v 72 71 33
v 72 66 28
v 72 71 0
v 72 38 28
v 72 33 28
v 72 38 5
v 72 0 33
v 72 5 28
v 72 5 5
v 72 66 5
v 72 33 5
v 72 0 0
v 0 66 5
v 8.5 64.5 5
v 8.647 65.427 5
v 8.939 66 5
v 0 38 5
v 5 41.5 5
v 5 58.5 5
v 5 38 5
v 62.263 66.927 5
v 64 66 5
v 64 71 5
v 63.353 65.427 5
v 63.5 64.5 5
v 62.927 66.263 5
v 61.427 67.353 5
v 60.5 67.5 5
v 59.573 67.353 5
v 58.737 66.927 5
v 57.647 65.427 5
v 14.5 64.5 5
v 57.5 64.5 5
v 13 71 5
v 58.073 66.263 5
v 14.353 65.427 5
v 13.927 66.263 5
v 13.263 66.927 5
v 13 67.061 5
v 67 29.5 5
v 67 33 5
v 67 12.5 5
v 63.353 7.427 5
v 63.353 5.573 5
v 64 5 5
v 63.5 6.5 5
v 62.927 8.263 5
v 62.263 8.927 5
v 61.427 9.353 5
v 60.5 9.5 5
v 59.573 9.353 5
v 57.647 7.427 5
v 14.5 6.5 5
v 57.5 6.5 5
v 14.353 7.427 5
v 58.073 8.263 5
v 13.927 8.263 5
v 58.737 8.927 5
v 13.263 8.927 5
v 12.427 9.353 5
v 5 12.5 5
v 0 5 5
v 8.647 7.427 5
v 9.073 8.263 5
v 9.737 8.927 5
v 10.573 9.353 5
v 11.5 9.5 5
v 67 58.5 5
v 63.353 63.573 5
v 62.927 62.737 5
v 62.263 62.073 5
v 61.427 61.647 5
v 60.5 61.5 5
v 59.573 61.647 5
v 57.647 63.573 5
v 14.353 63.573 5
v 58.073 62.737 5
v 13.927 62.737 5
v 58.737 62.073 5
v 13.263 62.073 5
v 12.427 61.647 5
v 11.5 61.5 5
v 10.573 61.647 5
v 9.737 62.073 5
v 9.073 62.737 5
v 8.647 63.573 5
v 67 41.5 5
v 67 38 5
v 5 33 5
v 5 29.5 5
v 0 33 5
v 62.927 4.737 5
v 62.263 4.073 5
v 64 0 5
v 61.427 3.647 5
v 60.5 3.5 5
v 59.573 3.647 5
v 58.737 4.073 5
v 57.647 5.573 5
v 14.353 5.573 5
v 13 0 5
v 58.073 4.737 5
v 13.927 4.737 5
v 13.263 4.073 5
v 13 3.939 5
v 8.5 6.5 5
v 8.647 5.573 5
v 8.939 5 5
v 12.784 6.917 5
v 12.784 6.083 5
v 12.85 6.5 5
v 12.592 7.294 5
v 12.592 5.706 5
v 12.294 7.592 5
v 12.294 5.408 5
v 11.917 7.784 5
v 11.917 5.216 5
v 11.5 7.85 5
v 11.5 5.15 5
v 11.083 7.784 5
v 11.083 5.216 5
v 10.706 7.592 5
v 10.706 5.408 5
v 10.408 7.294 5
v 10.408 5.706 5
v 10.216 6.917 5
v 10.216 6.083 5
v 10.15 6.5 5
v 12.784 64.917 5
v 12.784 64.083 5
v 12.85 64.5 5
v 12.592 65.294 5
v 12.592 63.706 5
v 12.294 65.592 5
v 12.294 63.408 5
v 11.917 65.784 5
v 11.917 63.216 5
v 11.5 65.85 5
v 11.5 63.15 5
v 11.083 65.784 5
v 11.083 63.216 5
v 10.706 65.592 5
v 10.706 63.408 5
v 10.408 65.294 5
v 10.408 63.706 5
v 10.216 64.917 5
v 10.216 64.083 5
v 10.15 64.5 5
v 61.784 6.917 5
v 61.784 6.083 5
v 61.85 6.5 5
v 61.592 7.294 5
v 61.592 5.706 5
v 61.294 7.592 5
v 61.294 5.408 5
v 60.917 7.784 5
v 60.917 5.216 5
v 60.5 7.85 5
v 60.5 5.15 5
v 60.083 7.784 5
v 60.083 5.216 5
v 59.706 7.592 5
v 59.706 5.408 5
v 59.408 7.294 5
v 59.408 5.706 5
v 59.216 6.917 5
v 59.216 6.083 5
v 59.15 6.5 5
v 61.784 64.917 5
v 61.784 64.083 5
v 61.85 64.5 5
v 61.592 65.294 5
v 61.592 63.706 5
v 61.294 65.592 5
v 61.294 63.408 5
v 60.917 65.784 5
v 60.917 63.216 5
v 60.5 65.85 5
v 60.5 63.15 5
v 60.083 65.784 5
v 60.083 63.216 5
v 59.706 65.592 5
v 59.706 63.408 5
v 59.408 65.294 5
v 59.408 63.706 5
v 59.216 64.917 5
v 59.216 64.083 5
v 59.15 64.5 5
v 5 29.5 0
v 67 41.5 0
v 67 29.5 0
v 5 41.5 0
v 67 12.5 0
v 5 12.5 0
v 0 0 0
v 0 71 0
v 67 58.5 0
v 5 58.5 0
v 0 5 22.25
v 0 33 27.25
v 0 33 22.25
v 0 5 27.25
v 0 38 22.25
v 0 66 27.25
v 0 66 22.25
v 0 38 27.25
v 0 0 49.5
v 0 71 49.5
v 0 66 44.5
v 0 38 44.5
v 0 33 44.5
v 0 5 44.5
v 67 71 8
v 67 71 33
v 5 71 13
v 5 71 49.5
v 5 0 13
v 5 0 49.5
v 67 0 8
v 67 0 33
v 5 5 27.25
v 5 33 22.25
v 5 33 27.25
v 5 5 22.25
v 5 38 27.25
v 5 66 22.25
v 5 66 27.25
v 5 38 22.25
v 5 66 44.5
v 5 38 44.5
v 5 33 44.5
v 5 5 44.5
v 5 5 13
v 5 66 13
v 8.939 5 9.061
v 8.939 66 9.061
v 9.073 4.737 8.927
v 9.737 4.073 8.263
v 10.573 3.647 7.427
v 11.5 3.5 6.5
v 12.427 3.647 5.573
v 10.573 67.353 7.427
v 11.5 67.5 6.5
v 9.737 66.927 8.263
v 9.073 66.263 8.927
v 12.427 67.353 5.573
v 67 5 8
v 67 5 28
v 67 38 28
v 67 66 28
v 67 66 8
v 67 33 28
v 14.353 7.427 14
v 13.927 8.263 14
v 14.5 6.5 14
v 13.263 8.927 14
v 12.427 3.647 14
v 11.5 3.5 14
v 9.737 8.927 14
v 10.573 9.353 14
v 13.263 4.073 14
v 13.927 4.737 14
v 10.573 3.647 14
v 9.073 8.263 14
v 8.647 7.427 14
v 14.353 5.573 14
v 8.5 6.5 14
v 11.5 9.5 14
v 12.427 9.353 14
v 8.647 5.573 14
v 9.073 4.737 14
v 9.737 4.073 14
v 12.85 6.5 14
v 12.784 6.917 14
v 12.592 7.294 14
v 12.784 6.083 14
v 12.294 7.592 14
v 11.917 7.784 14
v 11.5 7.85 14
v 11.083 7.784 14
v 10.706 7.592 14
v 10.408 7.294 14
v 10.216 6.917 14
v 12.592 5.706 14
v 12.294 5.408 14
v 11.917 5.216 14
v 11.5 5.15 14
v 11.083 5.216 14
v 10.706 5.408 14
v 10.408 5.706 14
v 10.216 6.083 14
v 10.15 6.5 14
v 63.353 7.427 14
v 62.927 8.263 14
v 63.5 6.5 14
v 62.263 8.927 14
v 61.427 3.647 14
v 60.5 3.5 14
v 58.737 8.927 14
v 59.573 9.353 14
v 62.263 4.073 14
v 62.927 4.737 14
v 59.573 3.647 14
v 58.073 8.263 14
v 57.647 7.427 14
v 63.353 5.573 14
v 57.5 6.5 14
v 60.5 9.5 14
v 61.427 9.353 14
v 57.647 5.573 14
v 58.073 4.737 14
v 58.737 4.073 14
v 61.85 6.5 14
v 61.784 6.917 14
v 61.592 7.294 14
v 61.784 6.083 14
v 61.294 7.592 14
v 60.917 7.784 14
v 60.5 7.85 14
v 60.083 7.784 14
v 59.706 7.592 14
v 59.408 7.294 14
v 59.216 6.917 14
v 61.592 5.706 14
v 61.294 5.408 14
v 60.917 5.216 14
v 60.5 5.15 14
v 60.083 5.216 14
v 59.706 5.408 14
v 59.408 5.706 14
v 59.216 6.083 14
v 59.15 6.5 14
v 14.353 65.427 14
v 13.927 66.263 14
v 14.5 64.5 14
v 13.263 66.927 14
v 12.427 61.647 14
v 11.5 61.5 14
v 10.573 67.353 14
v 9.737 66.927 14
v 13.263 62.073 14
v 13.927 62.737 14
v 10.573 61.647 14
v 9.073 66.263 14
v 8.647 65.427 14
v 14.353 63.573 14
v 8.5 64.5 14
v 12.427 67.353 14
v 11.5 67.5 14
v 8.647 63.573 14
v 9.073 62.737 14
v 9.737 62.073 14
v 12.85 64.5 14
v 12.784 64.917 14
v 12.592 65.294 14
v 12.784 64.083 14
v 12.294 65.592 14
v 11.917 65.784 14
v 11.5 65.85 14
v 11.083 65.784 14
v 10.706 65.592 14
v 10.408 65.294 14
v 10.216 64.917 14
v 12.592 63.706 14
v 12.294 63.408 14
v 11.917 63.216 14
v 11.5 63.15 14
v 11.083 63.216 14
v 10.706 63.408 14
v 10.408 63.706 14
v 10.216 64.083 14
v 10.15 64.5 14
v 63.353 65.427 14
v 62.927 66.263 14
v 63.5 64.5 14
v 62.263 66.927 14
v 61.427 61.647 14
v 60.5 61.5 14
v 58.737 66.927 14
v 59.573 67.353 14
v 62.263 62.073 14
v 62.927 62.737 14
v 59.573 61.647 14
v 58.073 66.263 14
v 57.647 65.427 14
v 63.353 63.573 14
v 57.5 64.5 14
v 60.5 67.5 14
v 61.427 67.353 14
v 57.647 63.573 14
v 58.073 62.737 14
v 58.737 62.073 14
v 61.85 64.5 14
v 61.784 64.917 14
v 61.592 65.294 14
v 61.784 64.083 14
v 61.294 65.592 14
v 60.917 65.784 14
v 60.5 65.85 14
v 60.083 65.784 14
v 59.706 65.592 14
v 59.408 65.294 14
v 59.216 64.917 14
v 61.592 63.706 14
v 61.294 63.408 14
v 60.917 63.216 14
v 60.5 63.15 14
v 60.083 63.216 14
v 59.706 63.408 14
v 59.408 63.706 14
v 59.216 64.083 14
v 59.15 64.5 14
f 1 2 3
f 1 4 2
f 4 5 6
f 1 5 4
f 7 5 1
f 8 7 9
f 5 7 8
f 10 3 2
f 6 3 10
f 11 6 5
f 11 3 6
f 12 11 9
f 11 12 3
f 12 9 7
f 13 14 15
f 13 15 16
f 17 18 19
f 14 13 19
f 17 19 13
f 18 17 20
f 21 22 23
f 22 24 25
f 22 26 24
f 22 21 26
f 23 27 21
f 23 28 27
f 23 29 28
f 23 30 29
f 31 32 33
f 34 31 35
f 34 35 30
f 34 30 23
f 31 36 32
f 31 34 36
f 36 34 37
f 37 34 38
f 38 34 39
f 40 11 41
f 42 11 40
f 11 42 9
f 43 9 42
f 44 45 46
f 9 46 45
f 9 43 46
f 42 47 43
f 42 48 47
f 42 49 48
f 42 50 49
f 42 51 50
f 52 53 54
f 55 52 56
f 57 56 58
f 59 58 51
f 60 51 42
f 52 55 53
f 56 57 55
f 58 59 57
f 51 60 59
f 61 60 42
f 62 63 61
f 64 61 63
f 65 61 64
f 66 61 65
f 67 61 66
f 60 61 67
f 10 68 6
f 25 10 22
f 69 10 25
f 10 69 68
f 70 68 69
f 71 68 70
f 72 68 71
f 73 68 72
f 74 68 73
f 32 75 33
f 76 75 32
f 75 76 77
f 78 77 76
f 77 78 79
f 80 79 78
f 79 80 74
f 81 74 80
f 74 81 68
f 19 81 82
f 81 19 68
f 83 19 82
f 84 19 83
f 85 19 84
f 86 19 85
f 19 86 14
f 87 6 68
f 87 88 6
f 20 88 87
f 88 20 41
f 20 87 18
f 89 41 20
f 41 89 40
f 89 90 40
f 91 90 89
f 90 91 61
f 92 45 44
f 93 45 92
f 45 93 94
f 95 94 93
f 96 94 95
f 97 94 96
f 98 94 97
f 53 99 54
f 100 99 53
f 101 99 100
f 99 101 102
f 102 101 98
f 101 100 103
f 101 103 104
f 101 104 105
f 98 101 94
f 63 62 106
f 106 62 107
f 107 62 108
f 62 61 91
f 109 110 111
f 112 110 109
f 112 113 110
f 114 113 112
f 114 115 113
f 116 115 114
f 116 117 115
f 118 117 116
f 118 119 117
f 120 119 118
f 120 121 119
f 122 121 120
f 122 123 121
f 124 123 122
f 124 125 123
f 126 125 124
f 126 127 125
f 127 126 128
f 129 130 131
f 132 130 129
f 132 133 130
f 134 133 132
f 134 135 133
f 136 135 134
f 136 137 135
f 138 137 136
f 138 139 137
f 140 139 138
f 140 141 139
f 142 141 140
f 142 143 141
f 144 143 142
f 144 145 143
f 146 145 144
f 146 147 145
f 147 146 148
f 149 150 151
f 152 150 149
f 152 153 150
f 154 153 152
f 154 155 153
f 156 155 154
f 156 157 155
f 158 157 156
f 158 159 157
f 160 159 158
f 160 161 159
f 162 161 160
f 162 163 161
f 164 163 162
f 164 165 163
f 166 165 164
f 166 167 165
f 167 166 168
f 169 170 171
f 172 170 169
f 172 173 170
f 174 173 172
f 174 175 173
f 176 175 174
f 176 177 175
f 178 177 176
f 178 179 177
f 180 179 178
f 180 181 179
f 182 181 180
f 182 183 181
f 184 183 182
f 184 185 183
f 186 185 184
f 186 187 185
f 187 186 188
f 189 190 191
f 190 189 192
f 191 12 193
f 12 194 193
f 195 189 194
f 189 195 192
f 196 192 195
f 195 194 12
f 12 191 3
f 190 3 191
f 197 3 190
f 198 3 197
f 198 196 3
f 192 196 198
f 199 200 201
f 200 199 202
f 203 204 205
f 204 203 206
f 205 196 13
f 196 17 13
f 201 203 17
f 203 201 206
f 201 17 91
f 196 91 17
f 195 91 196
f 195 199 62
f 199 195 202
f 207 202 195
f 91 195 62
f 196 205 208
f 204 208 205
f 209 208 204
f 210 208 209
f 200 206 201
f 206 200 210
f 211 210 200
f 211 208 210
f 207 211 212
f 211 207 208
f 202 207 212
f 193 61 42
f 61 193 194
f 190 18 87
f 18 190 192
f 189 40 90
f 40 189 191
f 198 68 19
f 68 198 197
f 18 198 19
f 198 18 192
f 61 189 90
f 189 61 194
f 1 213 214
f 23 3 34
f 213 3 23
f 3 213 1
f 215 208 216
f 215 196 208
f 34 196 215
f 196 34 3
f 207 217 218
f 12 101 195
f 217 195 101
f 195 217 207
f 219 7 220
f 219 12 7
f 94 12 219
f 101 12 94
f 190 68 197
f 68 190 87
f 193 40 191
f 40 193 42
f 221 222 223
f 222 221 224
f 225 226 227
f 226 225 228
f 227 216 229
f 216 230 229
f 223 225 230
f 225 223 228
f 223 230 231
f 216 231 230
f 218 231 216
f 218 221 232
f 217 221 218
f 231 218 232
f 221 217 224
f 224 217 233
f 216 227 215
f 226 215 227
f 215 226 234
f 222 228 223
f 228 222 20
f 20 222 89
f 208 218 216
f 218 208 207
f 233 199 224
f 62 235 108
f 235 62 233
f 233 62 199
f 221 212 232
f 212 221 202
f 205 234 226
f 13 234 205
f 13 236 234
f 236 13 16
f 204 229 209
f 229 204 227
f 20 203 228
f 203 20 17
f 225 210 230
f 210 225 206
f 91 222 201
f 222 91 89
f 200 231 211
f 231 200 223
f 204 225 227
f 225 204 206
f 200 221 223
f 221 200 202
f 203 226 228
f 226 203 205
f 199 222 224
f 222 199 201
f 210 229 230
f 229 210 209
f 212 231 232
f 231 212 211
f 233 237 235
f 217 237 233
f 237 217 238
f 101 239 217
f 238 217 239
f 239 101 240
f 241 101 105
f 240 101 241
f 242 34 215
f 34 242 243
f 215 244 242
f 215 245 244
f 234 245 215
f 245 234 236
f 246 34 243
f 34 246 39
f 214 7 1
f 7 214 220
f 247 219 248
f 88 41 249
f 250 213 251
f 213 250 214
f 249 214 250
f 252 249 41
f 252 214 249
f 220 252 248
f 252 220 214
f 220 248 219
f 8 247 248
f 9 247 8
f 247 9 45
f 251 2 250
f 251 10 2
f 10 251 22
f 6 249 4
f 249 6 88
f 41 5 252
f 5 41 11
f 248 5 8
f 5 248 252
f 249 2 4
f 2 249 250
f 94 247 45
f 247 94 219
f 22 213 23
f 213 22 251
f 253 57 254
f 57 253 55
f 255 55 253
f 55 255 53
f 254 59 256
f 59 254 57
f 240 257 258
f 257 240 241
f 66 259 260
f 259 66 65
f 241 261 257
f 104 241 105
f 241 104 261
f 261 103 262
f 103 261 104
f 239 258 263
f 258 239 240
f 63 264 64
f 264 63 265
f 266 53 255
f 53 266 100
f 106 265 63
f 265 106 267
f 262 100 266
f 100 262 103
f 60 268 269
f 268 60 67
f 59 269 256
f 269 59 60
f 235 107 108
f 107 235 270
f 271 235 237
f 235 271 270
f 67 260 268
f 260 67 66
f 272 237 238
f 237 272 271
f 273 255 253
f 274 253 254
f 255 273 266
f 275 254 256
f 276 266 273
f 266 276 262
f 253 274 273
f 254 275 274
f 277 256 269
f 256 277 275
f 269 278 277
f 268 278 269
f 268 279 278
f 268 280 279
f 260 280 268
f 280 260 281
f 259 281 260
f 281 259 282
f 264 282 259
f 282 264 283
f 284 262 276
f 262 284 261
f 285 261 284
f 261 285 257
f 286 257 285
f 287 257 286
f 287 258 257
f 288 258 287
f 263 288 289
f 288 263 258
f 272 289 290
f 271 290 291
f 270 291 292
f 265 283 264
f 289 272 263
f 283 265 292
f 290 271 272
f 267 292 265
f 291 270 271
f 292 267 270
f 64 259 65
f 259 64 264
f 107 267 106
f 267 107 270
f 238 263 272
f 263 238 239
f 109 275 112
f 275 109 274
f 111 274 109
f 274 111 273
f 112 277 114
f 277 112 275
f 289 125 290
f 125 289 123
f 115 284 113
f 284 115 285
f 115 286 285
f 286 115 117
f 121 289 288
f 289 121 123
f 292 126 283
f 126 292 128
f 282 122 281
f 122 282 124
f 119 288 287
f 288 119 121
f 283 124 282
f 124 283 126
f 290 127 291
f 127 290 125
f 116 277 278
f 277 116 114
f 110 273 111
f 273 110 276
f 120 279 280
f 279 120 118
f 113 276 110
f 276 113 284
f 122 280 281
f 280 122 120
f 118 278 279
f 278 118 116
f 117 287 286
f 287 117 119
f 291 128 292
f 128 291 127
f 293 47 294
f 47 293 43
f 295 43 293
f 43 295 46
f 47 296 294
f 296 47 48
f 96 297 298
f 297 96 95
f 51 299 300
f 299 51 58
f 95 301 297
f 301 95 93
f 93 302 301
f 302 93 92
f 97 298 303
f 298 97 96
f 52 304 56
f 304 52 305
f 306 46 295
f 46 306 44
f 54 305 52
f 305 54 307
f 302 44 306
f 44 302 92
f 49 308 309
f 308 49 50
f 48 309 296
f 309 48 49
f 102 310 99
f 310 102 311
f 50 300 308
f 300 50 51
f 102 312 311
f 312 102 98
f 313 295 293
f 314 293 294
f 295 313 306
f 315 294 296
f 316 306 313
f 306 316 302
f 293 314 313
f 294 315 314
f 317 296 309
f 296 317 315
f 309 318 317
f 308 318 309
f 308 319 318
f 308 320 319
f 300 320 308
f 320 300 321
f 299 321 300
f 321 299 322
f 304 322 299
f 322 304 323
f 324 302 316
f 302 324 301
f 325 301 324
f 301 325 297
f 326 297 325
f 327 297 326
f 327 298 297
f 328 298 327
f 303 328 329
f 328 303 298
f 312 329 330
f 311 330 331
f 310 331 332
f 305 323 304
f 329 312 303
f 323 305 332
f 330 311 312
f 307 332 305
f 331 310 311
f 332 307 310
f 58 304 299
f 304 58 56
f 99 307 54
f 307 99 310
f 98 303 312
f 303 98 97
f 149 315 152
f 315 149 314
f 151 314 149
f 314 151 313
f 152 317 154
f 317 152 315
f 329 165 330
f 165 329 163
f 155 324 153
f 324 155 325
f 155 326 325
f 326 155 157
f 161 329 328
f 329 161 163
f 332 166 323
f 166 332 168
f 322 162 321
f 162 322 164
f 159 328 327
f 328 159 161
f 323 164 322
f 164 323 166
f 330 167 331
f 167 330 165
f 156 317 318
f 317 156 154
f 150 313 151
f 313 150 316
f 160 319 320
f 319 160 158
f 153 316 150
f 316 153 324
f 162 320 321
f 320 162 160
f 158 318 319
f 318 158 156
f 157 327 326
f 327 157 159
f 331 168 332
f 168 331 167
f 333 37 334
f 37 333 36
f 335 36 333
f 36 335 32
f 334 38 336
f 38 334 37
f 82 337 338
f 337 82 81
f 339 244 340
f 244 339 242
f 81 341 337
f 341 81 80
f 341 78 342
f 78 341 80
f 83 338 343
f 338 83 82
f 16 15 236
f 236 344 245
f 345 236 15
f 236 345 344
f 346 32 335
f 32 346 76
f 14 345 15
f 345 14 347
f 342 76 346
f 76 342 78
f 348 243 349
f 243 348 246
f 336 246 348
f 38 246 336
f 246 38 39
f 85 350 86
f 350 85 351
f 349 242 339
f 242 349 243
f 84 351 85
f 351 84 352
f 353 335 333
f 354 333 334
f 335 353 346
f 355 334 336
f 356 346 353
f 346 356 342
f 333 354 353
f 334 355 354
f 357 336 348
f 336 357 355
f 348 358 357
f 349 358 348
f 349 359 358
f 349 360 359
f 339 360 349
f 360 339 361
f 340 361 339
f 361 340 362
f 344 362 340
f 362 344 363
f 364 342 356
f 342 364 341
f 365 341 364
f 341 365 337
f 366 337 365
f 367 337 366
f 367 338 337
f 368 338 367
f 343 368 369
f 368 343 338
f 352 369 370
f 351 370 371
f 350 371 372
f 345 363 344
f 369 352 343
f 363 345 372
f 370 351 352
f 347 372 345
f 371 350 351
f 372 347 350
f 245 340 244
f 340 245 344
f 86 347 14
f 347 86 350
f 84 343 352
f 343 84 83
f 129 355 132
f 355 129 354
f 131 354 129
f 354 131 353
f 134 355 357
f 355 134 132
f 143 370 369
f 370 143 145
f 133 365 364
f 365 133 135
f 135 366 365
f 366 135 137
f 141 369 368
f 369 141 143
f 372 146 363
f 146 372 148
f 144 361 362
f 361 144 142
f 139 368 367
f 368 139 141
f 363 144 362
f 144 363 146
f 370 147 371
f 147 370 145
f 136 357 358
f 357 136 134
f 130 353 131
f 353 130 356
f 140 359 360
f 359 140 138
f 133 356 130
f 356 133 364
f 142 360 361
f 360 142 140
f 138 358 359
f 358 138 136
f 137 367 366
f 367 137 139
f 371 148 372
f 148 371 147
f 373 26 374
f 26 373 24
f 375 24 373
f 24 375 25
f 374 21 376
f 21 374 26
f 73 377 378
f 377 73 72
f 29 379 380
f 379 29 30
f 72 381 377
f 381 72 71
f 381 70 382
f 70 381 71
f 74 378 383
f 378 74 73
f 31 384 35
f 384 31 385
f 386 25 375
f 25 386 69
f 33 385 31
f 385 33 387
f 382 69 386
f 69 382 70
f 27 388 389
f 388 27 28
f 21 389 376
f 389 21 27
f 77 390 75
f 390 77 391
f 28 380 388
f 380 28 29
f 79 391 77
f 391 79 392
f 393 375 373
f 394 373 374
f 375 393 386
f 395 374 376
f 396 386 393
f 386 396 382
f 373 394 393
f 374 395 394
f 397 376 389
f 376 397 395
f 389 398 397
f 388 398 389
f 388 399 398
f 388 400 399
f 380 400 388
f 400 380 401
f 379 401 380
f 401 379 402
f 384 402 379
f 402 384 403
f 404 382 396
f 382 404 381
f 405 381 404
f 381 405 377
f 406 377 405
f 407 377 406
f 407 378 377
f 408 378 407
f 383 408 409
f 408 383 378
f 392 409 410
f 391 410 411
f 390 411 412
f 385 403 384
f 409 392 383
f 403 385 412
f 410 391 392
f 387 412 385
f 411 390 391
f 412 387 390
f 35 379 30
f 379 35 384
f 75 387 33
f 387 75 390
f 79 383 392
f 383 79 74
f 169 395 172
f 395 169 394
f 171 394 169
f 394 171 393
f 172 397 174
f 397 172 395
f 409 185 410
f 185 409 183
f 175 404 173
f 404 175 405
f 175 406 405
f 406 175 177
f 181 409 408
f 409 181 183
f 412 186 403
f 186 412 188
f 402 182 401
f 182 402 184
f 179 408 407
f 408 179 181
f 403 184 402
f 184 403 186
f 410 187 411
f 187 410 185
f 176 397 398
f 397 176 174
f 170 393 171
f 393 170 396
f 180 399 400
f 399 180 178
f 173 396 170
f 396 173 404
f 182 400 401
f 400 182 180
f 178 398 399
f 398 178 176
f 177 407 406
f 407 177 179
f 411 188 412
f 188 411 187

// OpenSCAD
// Neato XV Signature Pro - Outer Left Pod
// Mounts: Yahboom PD Power Expansion Board
// Location: outer left (exposed edge), viewed from behind robot
// One-piece print — flat on bed, no supports needed.
//
// ORIENTATION (as mounted on robot):
//   Bottom face = velcros to robot chassis
//   Walls on short board axis (56mm), open on long axis (65mm)
//   Outer (left/exposed) wall: 75% height, mid + top beams
//   Inner (right/vent) wall: 50% height, top beam only

// ============================================================
// PARAMETERS
// ============================================================

pod_width  = 72;
pod_depth  = 71;
pod_height = 66;

rail_w = 5;
rib_w  = 12;

outer_wall_h = pod_height * 0.75;  // ~50mm — protection on exposed edge
inner_wall_h = pod_height * 0.50;  // ~33mm — wire routing access

standoff_h    = 9;
standoff_od   = 6;
standoff_hole = 2.7; // M2.5

yahboom_hole_x_span = 49;
yahboom_hole_y_span = 58;

yahboom_x_left  = (pod_width - yahboom_hole_x_span) / 2;
yahboom_x_right = yahboom_x_left + yahboom_hole_x_span;

yahboom_y_front = (pod_depth - yahboom_hole_y_span) / 2;
yahboom_y_rear  = yahboom_y_front + yahboom_hole_y_span;
yahboom_y_mid   = (yahboom_y_front + yahboom_y_rear) / 2;

rib_positions = [yahboom_y_front, yahboom_y_mid, yahboom_y_rear];

yahboom_holes = [
    [yahboom_x_left,  yahboom_y_front],
    [yahboom_x_right, yahboom_y_front],
    [yahboom_x_left,  yahboom_y_rear ],
    [yahboom_x_right, yahboom_y_rear ],
];

// ============================================================
// MODULES
// ============================================================

module gusset() {
    rotate([90, 0, 0])
        translate([0, 0, -5])
            linear_extrude(height=5)
                polygon([[0,0], [8,0], [0,8]]);
}

module ribbed_bottom() {
    cube([rail_w, pod_depth, rail_w]);
    translate([pod_width - rail_w, 0, 0])
        cube([rail_w, pod_depth, rail_w]);
    cube([pod_width, rail_w, rail_w]);
    translate([0, pod_depth - rail_w, 0])
        cube([pod_width, rail_w, rail_w]);
    for (y_center = rib_positions) {
        translate([0, y_center - rib_w / 2, 0])
            cube([pod_width, rib_w, rail_w]);
    }
}

module outer_wall() {
    cube([rail_w, rail_w, outer_wall_h]);
    translate([0, pod_depth - rail_w, 0])
        cube([rail_w, rail_w, outer_wall_h]);
    // Center post
    translate([0, pod_depth / 2 - rail_w / 2, 0])
        cube([rail_w, rail_w, outer_wall_h]);
    translate([0, 0, outer_wall_h / 2 - rail_w / 2])
        cube([rail_w, pod_depth, rail_w]);
    translate([0, 0, outer_wall_h - rail_w])
        cube([rail_w, pod_depth, rail_w]);
    // Gussets — back and front only, no gusset on center post
    translate([rail_w, 0, rail_w])
        gusset();
    translate([rail_w, pod_depth, rail_w])
        mirror([0, 1, 0]) gusset();
}

module inner_wall() {
    translate([pod_width - rail_w, 0, 0]) {
        cube([rail_w, rail_w, inner_wall_h]);
        translate([0, pod_depth - rail_w, 0])
            cube([rail_w, rail_w, inner_wall_h]);
        // Center post
        translate([0, pod_depth / 2 - rail_w / 2, 0])
            cube([rail_w, rail_w, inner_wall_h]);
        translate([0, 0, inner_wall_h - rail_w])
            cube([rail_w, pod_depth, rail_w]);
        // Gussets — back and front only, no gusset on center post
        translate([rail_w, 0, rail_w])
            mirror([1, 0, 0]) gusset();
        translate([rail_w, pod_depth, rail_w])
            mirror([1, 0, 0]) mirror([0, 1, 0]) gusset();
    }
}

module standoff(h, hole_d) {
    difference() {
        cylinder(h=h, d=standoff_od, $fn=20);
        cylinder(h=h + 0.1, d=hole_d, $fn=20);
    }
}

// ============================================================
// MAIN
// ============================================================

module outer_left_pod() {
    union() {
        ribbed_bottom();
        outer_wall();
        inner_wall();

        for (h = yahboom_holes) {
            translate([h[0], h[1], rail_w])
                standoff(standoff_h, standoff_hole);
        }
    }
}

outer_left_pod();
